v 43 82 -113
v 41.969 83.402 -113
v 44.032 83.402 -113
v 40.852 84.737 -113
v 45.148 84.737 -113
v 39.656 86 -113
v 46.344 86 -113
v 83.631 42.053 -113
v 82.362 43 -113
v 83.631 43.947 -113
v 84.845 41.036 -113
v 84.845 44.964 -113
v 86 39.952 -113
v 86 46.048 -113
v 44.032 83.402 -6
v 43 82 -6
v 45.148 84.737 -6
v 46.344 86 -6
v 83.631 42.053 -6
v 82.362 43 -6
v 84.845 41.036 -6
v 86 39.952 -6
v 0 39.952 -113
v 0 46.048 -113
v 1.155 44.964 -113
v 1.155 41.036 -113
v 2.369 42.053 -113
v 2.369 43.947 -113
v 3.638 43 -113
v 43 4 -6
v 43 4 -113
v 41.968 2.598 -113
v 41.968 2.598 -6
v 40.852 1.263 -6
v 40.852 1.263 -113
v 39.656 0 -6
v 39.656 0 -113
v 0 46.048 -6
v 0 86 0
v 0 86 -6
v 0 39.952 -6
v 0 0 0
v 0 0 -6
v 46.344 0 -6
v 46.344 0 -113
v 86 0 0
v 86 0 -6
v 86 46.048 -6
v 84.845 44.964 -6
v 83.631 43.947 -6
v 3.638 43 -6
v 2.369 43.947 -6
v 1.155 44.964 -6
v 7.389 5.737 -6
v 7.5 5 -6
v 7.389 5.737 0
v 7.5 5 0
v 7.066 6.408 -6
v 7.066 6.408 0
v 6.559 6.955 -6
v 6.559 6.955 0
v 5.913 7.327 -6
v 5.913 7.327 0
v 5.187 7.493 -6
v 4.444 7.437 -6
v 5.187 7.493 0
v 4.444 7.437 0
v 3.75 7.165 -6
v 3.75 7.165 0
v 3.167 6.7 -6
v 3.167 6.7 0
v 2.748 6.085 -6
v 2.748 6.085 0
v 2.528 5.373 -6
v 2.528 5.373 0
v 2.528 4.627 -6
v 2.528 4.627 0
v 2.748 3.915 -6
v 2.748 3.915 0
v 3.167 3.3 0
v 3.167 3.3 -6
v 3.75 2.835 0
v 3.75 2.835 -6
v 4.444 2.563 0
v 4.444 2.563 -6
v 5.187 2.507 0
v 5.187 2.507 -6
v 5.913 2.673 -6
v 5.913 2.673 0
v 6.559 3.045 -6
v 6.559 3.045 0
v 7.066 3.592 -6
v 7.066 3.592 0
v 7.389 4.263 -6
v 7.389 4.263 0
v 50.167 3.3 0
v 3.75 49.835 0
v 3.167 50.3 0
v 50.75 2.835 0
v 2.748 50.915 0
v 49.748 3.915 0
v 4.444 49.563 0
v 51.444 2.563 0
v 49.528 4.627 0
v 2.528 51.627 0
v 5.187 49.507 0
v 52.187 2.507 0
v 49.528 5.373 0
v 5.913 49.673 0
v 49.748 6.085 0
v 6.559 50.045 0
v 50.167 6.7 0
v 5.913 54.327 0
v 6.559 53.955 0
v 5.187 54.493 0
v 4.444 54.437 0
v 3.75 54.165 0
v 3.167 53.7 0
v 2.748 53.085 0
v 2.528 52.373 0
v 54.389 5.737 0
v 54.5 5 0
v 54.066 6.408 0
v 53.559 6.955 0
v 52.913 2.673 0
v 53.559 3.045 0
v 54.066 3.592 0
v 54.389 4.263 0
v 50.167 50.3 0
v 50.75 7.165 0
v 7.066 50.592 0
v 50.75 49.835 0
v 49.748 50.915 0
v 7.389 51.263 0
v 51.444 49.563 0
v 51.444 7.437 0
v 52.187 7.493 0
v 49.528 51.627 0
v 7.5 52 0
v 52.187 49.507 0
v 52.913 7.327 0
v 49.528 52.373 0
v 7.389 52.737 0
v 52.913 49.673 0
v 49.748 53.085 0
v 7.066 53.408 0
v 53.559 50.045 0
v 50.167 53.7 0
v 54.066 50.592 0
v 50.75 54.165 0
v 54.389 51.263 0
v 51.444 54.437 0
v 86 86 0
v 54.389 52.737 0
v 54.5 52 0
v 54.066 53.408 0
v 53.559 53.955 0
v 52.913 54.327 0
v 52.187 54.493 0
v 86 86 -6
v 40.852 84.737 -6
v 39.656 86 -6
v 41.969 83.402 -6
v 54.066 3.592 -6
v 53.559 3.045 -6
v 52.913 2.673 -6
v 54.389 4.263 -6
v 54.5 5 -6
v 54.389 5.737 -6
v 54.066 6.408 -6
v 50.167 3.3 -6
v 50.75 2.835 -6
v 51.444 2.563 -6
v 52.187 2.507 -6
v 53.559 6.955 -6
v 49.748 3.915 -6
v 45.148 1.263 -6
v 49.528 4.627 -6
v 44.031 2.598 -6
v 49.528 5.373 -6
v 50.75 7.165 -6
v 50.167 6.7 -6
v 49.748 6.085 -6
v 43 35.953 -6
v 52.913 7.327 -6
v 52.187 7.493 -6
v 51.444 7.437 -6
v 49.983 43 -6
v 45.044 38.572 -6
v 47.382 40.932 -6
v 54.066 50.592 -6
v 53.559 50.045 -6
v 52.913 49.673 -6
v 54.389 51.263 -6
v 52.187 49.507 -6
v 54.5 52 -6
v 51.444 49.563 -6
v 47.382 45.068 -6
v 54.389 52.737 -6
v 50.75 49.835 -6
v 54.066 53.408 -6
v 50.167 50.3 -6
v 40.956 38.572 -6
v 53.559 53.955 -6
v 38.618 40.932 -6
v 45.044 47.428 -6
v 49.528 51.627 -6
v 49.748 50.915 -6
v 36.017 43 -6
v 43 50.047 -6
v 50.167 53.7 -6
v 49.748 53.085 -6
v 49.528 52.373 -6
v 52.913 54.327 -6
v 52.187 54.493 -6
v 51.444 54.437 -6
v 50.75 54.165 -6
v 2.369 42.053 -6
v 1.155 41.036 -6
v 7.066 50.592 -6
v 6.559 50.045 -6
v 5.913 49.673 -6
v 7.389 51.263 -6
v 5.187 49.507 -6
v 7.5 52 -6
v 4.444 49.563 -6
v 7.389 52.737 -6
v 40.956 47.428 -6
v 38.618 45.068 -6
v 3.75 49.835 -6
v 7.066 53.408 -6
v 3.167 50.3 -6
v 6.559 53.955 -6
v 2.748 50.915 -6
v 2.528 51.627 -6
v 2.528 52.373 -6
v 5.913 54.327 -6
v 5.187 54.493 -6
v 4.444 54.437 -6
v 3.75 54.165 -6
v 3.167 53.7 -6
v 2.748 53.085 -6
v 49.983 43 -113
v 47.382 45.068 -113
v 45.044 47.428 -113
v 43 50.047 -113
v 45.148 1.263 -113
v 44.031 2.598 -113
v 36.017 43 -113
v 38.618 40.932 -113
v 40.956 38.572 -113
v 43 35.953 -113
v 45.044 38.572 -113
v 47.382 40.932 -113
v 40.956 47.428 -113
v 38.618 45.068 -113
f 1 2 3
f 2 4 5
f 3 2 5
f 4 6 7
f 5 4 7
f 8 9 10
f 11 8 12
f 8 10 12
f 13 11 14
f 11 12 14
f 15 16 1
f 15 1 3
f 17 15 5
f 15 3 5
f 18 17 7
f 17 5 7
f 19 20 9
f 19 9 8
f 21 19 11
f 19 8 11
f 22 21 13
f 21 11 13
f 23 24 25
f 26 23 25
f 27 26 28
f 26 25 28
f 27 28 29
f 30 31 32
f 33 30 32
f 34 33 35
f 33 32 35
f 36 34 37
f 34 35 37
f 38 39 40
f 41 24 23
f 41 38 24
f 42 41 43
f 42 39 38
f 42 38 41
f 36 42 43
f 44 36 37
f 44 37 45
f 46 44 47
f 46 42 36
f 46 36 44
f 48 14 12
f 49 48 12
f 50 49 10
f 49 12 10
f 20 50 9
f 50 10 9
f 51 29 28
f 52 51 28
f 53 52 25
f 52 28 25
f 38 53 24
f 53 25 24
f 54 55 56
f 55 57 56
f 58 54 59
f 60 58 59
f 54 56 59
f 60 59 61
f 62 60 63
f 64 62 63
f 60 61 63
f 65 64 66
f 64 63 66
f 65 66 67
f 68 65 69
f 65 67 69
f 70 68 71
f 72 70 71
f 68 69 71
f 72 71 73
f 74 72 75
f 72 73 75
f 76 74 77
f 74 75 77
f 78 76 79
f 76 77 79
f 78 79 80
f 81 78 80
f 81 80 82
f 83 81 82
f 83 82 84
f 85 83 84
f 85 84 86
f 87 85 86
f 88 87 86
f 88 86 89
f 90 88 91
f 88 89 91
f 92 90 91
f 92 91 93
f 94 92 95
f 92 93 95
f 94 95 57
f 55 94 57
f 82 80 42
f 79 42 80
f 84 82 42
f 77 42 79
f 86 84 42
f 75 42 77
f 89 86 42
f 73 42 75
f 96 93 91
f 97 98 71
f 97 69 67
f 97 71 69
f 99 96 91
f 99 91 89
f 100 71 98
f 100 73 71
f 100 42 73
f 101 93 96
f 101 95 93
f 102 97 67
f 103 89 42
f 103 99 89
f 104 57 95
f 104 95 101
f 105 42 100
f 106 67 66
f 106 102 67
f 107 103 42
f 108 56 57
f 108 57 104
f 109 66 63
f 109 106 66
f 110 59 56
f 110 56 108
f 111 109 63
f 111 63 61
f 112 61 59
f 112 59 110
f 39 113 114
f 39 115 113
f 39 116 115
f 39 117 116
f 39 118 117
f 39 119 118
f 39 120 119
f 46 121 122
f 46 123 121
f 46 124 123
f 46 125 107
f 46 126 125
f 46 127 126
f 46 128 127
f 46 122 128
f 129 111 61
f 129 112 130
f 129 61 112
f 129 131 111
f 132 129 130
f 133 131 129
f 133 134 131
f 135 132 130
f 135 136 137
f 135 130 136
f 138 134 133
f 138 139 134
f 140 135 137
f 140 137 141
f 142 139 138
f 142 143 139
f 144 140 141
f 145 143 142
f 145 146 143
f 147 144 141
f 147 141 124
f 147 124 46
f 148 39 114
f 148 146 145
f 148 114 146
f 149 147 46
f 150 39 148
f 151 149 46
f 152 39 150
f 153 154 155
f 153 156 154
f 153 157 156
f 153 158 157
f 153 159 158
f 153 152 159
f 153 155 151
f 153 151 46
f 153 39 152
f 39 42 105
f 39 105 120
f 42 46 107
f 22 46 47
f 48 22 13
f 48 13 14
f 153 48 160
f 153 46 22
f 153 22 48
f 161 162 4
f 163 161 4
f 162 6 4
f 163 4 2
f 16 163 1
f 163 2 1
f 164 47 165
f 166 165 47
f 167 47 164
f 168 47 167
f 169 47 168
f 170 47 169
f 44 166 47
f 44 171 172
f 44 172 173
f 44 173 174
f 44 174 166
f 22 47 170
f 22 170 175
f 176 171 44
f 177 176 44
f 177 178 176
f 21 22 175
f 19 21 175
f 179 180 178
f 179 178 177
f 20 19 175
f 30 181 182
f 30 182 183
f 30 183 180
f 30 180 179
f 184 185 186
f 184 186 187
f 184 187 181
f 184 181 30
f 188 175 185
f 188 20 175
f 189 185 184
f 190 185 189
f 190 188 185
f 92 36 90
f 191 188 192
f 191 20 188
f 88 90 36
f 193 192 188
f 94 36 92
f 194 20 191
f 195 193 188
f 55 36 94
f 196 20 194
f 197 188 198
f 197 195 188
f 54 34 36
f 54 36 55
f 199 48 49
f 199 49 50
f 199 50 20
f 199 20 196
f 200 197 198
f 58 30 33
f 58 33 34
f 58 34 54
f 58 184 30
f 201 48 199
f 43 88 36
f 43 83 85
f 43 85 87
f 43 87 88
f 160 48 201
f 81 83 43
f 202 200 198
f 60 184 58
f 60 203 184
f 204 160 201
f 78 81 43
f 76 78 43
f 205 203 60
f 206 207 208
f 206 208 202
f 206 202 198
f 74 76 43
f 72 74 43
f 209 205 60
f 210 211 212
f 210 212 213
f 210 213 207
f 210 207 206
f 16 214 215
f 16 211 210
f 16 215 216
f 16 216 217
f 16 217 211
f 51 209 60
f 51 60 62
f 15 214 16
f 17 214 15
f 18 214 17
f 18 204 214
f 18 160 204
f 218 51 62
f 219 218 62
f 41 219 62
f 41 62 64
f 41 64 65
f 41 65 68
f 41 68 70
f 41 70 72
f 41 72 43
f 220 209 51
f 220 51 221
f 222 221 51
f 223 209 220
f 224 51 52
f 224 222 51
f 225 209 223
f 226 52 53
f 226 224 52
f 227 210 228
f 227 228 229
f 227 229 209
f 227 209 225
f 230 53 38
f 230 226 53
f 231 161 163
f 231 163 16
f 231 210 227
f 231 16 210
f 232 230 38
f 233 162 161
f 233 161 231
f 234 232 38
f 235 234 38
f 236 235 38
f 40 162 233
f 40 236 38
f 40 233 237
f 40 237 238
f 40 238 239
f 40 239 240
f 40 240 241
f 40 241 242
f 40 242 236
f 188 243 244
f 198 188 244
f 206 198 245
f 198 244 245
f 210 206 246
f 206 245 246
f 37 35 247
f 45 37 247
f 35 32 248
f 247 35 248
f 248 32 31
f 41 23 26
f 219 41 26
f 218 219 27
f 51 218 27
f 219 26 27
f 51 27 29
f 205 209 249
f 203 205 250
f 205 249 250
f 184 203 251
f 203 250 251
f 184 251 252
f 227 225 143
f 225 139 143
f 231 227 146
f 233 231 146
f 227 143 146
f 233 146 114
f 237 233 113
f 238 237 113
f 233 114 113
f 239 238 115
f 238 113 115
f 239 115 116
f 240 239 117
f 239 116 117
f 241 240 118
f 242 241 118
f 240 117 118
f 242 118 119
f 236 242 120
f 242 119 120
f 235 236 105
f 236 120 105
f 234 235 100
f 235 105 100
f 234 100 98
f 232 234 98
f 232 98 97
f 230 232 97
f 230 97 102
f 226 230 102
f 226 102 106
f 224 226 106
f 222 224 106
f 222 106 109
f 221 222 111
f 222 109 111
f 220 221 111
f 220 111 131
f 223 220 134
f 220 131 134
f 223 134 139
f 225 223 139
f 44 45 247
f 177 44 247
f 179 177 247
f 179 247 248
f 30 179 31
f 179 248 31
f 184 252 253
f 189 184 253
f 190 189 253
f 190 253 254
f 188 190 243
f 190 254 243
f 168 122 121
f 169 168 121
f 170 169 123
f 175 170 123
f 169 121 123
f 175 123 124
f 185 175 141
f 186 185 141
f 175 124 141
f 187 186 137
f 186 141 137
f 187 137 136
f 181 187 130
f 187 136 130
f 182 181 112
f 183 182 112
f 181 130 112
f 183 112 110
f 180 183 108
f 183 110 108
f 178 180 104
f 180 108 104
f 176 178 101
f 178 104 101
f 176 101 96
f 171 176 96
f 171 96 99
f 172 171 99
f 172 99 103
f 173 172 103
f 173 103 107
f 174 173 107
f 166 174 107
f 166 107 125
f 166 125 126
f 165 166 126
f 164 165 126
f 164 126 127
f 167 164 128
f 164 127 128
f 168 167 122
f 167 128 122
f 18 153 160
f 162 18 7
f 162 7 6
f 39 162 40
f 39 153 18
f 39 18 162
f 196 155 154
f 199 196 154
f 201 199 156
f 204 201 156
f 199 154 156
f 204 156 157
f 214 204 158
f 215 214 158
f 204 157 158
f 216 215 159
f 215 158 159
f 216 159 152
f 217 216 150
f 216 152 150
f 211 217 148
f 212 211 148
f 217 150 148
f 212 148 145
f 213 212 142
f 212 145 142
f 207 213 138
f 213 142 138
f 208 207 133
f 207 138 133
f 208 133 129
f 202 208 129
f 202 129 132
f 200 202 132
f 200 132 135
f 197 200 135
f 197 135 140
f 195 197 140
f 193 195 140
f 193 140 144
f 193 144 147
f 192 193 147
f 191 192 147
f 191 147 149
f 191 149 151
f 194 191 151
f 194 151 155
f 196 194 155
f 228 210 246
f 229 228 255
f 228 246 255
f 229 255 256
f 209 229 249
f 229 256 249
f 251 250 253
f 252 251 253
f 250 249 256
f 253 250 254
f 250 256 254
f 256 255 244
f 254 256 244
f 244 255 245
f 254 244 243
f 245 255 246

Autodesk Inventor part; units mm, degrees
ref_plane "YZ Plane" through (0, 0, 0) normal (1, 0, 0) x (0, 1, 0)
ref_plane "XZ Plane" through (0, 0, 0) normal (0, 1, 0) x (-1, 0, 0)
sketch "Sketch1" plane through (0, 0, 0) normal (0, 0, 1) x (1, 0, 0)
  line L0 (0, 0) -> (86, 0)
  line L1 (86, 0) -> (86, 86)
  line L2 (86, 86) -> (0, 86)
  line L3 (0, 86) -> (0, 0)
  circle A0 centre (5, 5) radius 2.5
  circle A1 centre (52, 5) radius 2.5
  circle A2 centre (5, 52) radius 2.5
  circle A3 centre (52, 52) radius 2.5
  dimension "d0" = 86
  dimension "d1" = 86
  dimension "d2" = 5
  dimension "d3" = 5
  dimension "d4" = 5
extrude "Extrusion1" add sketch "Sketch1" against normal blind 113
sketch "Sketch2" plane through (0, 0, -113) normal (0, 0, -1) x (-1, 0, 0)
  line L0 (0, 86) -> (-86, 86) projected
  line L1 (-43, 86) -> (-43, 0)
  line L2 (-86, 0) -> (0, 0) projected
  line L3 (-86, 86) -> (-86, 0) projected
  line L4 (-86, 43) -> (0, 43)
  line L5 (0, 0) -> (0, 86) projected
  arc A0 (-46.3441, 0) -> (-86, 39.9524) centre (-66.1721, 19.9762) ccw
  line L6 (-86, 39.9524) -> (-86, 0)
  line L7 (0, 0) -> (-86, 0)
  line L8 (0, 86) -> (0, 0)
  arc A1 (0, 39.9524) -> (-39.6559, 0) centre (-19.8279, 19.9762) ccw
  line L9 (-86, 86) -> (0, 86)
  arc A2 (-86, 46.0476) -> (-46.3441, 86) centre (-66.1721, 66.0238) ccw
  line L10 (-86, 46.0476) -> (-86, 86)
  arc A3 (-39.6559, 86) -> (0, 46.0476) centre (-19.8279, 66.0238) ccw
  line L11 (0, 86) -> (-86, 86)
  point P0 (0, 39.9524)
  point P1 (-39.6559, 0)
  point P2 (-39.6559, 86)
  point P3 (0, 46.0476)
  point P4 (-86, 46.0476)
  point P5 (-46.3441, 86)
extrude "Extrusion2" cut sketch "Sketch2" against normal blind 107 contours L5 A3 A1 A2 L0 | A2 L1 | A3 A2 A0 L3 L0 | L1 A3 | A3 L4 | L4 A1 | A1 L5 L2 A0 A3 | A2 L4 | L4 A0 | A0 A1 L2 L3 A2 | A0 L1 | L1 A1
properties part number "nema34"
